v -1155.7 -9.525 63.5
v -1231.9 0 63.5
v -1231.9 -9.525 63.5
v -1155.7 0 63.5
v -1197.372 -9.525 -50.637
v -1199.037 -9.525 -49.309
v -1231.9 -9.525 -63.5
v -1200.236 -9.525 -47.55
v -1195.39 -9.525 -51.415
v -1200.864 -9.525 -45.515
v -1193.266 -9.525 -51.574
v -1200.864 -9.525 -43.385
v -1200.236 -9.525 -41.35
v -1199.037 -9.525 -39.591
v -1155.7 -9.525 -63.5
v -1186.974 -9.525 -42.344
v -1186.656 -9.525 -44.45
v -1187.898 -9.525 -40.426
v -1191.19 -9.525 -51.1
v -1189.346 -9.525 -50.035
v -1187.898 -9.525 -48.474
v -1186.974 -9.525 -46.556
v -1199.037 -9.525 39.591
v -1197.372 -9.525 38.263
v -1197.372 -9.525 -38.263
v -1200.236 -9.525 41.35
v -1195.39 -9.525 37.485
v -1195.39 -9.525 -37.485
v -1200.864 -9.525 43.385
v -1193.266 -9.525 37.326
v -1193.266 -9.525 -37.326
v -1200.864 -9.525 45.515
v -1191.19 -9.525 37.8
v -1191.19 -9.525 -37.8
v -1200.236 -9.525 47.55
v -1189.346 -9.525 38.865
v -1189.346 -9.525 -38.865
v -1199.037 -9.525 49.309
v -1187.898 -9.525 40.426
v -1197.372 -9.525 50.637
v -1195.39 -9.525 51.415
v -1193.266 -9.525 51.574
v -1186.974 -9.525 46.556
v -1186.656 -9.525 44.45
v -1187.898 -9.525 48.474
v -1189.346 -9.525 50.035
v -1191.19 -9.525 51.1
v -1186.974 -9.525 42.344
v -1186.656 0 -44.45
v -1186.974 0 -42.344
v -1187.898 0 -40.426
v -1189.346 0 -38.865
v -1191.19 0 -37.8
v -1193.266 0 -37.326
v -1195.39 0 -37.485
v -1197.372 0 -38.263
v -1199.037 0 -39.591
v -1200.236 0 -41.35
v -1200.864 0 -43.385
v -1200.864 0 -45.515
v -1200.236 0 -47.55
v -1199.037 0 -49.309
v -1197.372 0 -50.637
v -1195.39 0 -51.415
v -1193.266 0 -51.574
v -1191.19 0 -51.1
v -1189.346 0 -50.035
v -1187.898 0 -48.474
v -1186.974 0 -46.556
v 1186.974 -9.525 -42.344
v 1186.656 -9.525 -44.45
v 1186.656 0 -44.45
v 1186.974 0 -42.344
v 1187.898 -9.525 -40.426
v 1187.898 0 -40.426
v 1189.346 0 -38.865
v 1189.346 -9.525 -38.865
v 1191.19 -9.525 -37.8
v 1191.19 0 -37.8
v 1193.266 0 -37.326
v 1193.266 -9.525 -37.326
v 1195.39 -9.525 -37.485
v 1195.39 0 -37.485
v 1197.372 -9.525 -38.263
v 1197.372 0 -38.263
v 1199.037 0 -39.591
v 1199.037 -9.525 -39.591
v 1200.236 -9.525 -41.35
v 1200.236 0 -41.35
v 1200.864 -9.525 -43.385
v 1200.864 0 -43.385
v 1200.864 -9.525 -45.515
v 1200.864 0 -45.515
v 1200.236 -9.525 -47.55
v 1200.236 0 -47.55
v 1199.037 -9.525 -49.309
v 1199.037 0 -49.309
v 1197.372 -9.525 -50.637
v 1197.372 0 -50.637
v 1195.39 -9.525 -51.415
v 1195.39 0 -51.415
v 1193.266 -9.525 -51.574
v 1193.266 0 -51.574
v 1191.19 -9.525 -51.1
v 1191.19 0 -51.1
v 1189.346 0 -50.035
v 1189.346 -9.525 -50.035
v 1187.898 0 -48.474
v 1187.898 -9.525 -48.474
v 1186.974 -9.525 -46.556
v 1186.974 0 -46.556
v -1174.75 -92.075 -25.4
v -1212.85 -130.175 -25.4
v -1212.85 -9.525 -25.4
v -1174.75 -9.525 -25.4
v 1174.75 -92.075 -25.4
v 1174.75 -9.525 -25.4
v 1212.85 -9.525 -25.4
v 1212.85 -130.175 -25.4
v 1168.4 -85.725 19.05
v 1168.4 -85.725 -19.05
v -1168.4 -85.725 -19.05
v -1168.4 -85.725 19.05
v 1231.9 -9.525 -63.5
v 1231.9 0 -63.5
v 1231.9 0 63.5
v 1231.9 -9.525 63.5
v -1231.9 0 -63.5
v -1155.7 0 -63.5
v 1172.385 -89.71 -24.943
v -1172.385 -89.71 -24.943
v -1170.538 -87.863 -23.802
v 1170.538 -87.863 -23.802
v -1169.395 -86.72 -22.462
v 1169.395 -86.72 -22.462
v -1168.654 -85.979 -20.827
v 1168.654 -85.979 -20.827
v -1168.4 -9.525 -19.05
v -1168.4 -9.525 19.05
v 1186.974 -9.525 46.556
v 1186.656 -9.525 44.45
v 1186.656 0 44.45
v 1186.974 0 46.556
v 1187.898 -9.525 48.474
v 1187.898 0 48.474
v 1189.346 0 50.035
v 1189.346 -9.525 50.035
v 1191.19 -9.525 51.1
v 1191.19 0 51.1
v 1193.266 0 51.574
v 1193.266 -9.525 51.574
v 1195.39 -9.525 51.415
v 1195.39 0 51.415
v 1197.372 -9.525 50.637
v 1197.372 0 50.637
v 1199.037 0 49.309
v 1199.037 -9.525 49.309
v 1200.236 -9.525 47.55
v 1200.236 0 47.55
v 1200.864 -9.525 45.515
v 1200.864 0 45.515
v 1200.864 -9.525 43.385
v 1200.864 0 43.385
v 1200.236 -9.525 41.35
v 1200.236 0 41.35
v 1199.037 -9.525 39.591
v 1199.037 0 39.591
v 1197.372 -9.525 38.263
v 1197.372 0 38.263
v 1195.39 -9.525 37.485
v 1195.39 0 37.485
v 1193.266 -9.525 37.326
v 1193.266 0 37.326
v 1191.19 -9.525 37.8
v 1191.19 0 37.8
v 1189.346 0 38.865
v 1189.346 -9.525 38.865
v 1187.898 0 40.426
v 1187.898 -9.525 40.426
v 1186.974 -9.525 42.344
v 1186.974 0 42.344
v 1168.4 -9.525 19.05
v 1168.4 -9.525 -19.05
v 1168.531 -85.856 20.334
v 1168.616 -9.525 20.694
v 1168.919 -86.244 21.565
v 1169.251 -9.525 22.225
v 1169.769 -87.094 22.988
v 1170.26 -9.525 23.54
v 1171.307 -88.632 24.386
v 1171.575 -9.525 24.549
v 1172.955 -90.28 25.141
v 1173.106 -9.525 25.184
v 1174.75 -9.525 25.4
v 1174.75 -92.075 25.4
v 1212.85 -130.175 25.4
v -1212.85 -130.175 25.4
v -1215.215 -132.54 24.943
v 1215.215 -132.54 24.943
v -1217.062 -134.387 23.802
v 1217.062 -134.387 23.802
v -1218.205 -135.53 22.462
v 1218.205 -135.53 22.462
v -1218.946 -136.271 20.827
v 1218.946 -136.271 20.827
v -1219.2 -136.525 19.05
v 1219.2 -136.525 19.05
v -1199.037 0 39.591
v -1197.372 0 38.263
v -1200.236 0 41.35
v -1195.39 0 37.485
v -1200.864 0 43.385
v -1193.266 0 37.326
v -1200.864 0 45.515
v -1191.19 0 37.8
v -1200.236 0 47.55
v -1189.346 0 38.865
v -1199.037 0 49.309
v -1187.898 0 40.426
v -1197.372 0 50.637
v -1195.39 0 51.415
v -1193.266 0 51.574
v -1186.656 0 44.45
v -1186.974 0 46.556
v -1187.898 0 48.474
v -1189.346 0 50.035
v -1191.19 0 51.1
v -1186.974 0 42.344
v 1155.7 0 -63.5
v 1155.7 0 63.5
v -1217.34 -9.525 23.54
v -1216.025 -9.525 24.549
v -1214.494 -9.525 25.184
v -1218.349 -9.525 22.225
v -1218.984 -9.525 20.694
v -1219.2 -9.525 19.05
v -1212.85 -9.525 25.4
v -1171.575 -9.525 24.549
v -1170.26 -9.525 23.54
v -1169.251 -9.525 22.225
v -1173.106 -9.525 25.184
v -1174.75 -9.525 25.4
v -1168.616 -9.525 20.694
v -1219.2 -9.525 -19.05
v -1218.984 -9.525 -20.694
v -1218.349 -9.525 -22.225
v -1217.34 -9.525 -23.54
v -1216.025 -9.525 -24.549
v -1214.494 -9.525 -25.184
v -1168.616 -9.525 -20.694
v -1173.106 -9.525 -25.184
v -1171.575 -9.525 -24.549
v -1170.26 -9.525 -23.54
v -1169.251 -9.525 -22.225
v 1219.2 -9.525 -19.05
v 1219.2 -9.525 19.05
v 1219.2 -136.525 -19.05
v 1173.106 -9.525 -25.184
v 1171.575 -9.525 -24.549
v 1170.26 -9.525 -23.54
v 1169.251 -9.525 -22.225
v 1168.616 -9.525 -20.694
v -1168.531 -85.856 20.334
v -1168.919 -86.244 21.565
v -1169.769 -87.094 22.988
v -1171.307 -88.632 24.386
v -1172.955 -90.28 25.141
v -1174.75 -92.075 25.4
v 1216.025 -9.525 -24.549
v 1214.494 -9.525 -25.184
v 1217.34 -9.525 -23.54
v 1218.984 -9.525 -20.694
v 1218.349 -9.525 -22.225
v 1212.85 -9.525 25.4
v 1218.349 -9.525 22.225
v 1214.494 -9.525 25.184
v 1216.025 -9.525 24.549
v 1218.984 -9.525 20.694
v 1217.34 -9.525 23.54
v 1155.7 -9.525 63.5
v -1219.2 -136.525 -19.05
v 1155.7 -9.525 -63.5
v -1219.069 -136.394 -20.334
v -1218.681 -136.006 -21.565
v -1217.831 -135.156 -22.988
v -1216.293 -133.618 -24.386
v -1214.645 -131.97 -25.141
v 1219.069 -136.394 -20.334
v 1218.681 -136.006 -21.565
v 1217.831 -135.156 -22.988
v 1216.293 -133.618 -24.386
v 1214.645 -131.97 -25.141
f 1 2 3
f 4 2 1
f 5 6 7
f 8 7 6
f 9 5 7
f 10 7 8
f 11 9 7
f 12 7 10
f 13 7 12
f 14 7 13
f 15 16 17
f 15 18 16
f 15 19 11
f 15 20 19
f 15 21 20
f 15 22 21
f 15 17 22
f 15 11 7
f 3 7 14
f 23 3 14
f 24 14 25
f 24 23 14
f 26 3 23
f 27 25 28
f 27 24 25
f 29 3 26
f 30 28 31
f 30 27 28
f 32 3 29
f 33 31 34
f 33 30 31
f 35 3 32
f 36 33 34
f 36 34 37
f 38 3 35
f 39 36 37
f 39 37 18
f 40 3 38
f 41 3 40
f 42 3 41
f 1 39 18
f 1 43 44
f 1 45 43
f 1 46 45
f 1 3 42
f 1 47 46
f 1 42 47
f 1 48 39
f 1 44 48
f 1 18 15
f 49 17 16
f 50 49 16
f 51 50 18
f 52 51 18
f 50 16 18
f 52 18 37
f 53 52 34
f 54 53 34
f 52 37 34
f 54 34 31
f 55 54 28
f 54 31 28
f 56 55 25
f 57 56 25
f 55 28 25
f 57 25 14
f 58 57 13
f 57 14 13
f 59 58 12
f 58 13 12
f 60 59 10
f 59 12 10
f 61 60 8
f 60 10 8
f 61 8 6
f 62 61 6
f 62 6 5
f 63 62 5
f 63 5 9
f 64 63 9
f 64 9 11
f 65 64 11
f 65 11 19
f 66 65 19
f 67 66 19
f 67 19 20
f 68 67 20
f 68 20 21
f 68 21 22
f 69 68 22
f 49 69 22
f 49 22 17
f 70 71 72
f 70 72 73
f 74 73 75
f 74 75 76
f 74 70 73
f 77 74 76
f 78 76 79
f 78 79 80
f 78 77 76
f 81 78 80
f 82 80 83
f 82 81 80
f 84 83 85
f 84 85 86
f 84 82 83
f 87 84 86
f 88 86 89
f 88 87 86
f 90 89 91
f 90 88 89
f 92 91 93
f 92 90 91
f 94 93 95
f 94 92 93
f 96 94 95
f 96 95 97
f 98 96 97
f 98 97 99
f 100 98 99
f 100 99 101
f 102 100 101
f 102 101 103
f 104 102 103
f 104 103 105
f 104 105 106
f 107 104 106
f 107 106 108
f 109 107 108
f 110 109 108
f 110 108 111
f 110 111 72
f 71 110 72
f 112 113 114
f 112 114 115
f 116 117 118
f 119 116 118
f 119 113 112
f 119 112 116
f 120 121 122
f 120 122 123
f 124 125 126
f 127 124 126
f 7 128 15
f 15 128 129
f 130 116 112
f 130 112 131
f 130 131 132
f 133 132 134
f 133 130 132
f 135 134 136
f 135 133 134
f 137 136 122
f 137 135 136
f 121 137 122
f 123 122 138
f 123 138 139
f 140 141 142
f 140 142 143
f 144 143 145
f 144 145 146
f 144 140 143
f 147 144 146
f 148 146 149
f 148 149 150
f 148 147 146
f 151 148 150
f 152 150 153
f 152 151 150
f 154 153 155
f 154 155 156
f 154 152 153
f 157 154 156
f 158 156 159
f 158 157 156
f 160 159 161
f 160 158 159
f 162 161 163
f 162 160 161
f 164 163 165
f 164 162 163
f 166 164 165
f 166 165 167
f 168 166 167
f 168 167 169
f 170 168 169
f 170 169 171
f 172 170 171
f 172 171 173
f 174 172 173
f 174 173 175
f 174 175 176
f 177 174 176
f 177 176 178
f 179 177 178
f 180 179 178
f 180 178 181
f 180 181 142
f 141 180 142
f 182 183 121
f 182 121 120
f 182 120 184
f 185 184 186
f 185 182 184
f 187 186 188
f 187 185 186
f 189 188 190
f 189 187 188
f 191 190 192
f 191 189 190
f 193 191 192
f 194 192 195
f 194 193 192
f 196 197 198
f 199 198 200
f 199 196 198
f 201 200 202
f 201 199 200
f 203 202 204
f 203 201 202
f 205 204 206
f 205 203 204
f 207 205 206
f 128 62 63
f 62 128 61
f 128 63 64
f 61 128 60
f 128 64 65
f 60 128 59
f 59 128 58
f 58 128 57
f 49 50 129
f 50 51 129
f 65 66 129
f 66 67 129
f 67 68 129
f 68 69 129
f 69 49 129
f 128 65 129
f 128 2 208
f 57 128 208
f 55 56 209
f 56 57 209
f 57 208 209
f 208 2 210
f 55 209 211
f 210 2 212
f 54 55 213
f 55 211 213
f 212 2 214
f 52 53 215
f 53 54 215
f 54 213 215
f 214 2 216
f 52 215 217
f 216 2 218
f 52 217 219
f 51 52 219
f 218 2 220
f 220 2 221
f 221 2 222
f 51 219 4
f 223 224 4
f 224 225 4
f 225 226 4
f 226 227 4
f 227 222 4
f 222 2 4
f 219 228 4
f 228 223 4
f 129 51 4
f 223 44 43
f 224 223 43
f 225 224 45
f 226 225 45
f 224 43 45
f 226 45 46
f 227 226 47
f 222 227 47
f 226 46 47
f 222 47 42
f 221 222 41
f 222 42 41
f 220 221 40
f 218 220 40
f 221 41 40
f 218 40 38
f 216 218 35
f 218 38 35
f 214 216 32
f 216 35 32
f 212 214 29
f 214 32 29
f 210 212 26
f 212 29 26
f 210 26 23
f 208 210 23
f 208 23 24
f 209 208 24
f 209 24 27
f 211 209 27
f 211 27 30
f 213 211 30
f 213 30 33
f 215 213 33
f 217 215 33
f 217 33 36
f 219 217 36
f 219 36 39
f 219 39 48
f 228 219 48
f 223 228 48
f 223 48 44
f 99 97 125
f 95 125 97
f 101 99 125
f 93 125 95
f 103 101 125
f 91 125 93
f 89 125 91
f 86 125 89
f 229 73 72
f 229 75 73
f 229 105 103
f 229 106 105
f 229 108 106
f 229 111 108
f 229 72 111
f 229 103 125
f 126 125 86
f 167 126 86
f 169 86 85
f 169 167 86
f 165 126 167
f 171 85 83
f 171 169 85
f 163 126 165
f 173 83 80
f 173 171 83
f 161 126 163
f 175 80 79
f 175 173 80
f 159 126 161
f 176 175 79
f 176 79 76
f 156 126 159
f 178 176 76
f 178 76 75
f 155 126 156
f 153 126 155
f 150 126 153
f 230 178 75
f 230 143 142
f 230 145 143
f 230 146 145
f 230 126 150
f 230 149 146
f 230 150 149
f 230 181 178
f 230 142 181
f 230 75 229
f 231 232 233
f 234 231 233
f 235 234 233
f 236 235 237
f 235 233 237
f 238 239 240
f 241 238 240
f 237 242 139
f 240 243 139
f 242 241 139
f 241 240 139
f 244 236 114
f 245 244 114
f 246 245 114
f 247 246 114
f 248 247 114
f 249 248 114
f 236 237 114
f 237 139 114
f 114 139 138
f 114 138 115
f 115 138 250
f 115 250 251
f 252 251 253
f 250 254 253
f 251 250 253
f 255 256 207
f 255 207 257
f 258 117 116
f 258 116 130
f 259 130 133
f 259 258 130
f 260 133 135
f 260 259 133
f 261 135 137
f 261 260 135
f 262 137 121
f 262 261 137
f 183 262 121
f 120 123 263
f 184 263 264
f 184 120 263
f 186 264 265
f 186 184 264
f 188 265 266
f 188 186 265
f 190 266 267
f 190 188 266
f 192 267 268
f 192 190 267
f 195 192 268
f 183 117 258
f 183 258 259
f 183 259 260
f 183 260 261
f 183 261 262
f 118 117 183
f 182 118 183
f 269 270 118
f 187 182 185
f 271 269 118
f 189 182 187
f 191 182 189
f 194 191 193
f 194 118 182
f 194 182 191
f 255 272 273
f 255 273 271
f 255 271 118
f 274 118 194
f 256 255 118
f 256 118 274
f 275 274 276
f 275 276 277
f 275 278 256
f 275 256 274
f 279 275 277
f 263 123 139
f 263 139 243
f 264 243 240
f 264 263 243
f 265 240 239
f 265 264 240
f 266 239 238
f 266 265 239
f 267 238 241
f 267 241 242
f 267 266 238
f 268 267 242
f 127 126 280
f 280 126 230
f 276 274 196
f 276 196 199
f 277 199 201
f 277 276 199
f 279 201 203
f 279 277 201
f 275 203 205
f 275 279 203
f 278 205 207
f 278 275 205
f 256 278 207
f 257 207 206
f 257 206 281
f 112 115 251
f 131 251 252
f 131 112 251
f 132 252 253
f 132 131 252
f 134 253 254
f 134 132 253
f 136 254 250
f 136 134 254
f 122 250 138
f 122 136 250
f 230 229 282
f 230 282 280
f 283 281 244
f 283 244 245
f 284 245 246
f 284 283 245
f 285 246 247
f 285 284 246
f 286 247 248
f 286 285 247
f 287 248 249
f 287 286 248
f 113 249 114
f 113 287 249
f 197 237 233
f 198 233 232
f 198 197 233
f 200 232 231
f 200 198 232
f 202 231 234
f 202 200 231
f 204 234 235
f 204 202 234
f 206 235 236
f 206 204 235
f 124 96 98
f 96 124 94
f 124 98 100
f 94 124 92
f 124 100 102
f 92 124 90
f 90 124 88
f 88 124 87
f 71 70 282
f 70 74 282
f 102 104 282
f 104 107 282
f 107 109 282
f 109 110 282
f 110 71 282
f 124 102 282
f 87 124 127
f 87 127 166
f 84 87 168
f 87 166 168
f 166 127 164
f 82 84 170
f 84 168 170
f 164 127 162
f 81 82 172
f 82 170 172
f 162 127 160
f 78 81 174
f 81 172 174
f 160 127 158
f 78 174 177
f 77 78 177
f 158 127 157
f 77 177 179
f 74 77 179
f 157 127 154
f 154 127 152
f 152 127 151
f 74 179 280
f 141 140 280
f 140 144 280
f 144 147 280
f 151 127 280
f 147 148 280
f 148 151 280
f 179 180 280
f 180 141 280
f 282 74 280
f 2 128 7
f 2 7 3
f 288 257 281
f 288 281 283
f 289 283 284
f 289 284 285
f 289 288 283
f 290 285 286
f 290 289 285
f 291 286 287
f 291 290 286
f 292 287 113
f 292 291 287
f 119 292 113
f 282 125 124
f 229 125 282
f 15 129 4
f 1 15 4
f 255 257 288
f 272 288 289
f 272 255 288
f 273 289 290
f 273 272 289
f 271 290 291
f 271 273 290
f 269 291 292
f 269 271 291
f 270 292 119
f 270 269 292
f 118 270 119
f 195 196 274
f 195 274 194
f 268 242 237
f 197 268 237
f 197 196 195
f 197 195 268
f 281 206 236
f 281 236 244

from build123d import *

# Parameters (mm, degrees)
F0_W     = 76.2
F0_H     = 127
F1_DEPTH = 9.525
F2_R     = 7.14375
F3_DEPTH = 25.4


with BuildPart() as f1:
    # F0 (on Front) → F1 (new body)
    with BuildSketch(Plane.XZ):
        with Locations((-1193.8, 0)):
            Rectangle(F0_W, F0_H)
        with BuildLine():
            ThreePointArc((-1219.2, 19.05), (-1217.3401280605, 23.5401280605), (-1212.85, 25.4))
            Line((-1212.85, 25.4), (-1174.75, 25.4))
            ThreePointArc((-1174.75, 25.4), (-1170.2598719395, 23.5401280605), (-1168.4, 19.05))
            Line((-1168.4, 19.05), (-1168.4, -19.05))
            ThreePointArc((-1168.4, -19.05), (-1170.2598719395, -23.5401280605), (-1174.75, -25.4))
            Line((-1174.75, -25.4), (-1212.85, -25.4))
            ThreePointArc((-1212.85, -25.4), (-1217.3401280605, -23.5401280605), (-1219.2, -19.05))
            Line((-1219.2, -19.05), (-1219.2, 19.05))
        make_face(mode=Mode.SUBTRACT)
        with BuildLine():
            Line((-1174.75, 25.4), (-1212.85, 25.4))
            ThreePointArc((-1212.85, 25.4), (-1217.3401280605, 23.5401280605), (-1219.2, 19.05))
            Line((-1219.2, 19.05), (-1219.2, -19.05))
            ThreePointArc((-1219.2, -19.05), (-1217.3401280605, -23.5401280605), (-1212.85, -25.4))
            Line((-1212.85, -25.4), (-1174.75, -25.4))
            ThreePointArc((-1174.75, -25.4), (-1170.2598719395, -23.5401280605), (-1168.4, -19.05))
            Line((-1168.4, -19.05), (-1168.4, 19.05))
            ThreePointArc((-1168.4, 19.05), (-1170.2598719395, 23.5401280605), (-1174.75, 25.4))
        make_face()
    extrude(amount=F1_DEPTH)

    # F2 (on face) → F3 (cut)
    with BuildSketch(Plane.XZ.offset(9.525)):
        with Locations((-1193.8, 44.45)):
            Circle(F2_R)
        with Locations((-1193.8, -44.45)):
            Circle(F2_R)
    extrude(amount=-F3_DEPTH, mode=Mode.SUBTRACT)


with BuildPart() as f4_1:
    # F4: instance of F1
    add(f1.part.mirror(Plane.YZ))


with BuildPart() as f7:
    # F7: sweep along a path in F6
    with BuildLine(Plane.XY) as f7_path:
        Line((-1193.8, -9.525), (-1193.8, -111.125))
        Line((-1193.8, -111.125), (1193.8, -111.125))
        Line((1193.8, -111.125), (1193.8, -9.525))
    # F5 (on face) → F7 (sweep)
    with BuildSketch(Plane.XZ.offset(9.525)):
        with BuildLine():
            Line((-1174.75, 25.4), (-1212.85, 25.4))
            ThreePointArc((-1212.85, 25.4), (-1217.3401280605, 23.5401280605), (-1219.2, 19.05))
            Line((-1219.2, 19.05), (-1219.2, -19.05))
            ThreePointArc((-1219.2, -19.05), (-1217.3401280605, -23.5401280605), (-1212.85, -25.4))
            Line((-1212.85, -25.4), (-1174.75, -25.4))
            ThreePointArc((-1174.75, -25.4), (-1170.2598719395, -23.5401280605), (-1168.4, -19.05))
            Line((-1168.4, -19.05), (-1168.4, 19.05))
            ThreePointArc((-1168.4, 19.05), (-1170.2598719395, 23.5401280605), (-1174.75, 25.4))
        make_face()
    sweep(path=f7_path.line, transition=Transition.RIGHT)


solid = Compound([f1.part, f4_1.part, f7.part])
